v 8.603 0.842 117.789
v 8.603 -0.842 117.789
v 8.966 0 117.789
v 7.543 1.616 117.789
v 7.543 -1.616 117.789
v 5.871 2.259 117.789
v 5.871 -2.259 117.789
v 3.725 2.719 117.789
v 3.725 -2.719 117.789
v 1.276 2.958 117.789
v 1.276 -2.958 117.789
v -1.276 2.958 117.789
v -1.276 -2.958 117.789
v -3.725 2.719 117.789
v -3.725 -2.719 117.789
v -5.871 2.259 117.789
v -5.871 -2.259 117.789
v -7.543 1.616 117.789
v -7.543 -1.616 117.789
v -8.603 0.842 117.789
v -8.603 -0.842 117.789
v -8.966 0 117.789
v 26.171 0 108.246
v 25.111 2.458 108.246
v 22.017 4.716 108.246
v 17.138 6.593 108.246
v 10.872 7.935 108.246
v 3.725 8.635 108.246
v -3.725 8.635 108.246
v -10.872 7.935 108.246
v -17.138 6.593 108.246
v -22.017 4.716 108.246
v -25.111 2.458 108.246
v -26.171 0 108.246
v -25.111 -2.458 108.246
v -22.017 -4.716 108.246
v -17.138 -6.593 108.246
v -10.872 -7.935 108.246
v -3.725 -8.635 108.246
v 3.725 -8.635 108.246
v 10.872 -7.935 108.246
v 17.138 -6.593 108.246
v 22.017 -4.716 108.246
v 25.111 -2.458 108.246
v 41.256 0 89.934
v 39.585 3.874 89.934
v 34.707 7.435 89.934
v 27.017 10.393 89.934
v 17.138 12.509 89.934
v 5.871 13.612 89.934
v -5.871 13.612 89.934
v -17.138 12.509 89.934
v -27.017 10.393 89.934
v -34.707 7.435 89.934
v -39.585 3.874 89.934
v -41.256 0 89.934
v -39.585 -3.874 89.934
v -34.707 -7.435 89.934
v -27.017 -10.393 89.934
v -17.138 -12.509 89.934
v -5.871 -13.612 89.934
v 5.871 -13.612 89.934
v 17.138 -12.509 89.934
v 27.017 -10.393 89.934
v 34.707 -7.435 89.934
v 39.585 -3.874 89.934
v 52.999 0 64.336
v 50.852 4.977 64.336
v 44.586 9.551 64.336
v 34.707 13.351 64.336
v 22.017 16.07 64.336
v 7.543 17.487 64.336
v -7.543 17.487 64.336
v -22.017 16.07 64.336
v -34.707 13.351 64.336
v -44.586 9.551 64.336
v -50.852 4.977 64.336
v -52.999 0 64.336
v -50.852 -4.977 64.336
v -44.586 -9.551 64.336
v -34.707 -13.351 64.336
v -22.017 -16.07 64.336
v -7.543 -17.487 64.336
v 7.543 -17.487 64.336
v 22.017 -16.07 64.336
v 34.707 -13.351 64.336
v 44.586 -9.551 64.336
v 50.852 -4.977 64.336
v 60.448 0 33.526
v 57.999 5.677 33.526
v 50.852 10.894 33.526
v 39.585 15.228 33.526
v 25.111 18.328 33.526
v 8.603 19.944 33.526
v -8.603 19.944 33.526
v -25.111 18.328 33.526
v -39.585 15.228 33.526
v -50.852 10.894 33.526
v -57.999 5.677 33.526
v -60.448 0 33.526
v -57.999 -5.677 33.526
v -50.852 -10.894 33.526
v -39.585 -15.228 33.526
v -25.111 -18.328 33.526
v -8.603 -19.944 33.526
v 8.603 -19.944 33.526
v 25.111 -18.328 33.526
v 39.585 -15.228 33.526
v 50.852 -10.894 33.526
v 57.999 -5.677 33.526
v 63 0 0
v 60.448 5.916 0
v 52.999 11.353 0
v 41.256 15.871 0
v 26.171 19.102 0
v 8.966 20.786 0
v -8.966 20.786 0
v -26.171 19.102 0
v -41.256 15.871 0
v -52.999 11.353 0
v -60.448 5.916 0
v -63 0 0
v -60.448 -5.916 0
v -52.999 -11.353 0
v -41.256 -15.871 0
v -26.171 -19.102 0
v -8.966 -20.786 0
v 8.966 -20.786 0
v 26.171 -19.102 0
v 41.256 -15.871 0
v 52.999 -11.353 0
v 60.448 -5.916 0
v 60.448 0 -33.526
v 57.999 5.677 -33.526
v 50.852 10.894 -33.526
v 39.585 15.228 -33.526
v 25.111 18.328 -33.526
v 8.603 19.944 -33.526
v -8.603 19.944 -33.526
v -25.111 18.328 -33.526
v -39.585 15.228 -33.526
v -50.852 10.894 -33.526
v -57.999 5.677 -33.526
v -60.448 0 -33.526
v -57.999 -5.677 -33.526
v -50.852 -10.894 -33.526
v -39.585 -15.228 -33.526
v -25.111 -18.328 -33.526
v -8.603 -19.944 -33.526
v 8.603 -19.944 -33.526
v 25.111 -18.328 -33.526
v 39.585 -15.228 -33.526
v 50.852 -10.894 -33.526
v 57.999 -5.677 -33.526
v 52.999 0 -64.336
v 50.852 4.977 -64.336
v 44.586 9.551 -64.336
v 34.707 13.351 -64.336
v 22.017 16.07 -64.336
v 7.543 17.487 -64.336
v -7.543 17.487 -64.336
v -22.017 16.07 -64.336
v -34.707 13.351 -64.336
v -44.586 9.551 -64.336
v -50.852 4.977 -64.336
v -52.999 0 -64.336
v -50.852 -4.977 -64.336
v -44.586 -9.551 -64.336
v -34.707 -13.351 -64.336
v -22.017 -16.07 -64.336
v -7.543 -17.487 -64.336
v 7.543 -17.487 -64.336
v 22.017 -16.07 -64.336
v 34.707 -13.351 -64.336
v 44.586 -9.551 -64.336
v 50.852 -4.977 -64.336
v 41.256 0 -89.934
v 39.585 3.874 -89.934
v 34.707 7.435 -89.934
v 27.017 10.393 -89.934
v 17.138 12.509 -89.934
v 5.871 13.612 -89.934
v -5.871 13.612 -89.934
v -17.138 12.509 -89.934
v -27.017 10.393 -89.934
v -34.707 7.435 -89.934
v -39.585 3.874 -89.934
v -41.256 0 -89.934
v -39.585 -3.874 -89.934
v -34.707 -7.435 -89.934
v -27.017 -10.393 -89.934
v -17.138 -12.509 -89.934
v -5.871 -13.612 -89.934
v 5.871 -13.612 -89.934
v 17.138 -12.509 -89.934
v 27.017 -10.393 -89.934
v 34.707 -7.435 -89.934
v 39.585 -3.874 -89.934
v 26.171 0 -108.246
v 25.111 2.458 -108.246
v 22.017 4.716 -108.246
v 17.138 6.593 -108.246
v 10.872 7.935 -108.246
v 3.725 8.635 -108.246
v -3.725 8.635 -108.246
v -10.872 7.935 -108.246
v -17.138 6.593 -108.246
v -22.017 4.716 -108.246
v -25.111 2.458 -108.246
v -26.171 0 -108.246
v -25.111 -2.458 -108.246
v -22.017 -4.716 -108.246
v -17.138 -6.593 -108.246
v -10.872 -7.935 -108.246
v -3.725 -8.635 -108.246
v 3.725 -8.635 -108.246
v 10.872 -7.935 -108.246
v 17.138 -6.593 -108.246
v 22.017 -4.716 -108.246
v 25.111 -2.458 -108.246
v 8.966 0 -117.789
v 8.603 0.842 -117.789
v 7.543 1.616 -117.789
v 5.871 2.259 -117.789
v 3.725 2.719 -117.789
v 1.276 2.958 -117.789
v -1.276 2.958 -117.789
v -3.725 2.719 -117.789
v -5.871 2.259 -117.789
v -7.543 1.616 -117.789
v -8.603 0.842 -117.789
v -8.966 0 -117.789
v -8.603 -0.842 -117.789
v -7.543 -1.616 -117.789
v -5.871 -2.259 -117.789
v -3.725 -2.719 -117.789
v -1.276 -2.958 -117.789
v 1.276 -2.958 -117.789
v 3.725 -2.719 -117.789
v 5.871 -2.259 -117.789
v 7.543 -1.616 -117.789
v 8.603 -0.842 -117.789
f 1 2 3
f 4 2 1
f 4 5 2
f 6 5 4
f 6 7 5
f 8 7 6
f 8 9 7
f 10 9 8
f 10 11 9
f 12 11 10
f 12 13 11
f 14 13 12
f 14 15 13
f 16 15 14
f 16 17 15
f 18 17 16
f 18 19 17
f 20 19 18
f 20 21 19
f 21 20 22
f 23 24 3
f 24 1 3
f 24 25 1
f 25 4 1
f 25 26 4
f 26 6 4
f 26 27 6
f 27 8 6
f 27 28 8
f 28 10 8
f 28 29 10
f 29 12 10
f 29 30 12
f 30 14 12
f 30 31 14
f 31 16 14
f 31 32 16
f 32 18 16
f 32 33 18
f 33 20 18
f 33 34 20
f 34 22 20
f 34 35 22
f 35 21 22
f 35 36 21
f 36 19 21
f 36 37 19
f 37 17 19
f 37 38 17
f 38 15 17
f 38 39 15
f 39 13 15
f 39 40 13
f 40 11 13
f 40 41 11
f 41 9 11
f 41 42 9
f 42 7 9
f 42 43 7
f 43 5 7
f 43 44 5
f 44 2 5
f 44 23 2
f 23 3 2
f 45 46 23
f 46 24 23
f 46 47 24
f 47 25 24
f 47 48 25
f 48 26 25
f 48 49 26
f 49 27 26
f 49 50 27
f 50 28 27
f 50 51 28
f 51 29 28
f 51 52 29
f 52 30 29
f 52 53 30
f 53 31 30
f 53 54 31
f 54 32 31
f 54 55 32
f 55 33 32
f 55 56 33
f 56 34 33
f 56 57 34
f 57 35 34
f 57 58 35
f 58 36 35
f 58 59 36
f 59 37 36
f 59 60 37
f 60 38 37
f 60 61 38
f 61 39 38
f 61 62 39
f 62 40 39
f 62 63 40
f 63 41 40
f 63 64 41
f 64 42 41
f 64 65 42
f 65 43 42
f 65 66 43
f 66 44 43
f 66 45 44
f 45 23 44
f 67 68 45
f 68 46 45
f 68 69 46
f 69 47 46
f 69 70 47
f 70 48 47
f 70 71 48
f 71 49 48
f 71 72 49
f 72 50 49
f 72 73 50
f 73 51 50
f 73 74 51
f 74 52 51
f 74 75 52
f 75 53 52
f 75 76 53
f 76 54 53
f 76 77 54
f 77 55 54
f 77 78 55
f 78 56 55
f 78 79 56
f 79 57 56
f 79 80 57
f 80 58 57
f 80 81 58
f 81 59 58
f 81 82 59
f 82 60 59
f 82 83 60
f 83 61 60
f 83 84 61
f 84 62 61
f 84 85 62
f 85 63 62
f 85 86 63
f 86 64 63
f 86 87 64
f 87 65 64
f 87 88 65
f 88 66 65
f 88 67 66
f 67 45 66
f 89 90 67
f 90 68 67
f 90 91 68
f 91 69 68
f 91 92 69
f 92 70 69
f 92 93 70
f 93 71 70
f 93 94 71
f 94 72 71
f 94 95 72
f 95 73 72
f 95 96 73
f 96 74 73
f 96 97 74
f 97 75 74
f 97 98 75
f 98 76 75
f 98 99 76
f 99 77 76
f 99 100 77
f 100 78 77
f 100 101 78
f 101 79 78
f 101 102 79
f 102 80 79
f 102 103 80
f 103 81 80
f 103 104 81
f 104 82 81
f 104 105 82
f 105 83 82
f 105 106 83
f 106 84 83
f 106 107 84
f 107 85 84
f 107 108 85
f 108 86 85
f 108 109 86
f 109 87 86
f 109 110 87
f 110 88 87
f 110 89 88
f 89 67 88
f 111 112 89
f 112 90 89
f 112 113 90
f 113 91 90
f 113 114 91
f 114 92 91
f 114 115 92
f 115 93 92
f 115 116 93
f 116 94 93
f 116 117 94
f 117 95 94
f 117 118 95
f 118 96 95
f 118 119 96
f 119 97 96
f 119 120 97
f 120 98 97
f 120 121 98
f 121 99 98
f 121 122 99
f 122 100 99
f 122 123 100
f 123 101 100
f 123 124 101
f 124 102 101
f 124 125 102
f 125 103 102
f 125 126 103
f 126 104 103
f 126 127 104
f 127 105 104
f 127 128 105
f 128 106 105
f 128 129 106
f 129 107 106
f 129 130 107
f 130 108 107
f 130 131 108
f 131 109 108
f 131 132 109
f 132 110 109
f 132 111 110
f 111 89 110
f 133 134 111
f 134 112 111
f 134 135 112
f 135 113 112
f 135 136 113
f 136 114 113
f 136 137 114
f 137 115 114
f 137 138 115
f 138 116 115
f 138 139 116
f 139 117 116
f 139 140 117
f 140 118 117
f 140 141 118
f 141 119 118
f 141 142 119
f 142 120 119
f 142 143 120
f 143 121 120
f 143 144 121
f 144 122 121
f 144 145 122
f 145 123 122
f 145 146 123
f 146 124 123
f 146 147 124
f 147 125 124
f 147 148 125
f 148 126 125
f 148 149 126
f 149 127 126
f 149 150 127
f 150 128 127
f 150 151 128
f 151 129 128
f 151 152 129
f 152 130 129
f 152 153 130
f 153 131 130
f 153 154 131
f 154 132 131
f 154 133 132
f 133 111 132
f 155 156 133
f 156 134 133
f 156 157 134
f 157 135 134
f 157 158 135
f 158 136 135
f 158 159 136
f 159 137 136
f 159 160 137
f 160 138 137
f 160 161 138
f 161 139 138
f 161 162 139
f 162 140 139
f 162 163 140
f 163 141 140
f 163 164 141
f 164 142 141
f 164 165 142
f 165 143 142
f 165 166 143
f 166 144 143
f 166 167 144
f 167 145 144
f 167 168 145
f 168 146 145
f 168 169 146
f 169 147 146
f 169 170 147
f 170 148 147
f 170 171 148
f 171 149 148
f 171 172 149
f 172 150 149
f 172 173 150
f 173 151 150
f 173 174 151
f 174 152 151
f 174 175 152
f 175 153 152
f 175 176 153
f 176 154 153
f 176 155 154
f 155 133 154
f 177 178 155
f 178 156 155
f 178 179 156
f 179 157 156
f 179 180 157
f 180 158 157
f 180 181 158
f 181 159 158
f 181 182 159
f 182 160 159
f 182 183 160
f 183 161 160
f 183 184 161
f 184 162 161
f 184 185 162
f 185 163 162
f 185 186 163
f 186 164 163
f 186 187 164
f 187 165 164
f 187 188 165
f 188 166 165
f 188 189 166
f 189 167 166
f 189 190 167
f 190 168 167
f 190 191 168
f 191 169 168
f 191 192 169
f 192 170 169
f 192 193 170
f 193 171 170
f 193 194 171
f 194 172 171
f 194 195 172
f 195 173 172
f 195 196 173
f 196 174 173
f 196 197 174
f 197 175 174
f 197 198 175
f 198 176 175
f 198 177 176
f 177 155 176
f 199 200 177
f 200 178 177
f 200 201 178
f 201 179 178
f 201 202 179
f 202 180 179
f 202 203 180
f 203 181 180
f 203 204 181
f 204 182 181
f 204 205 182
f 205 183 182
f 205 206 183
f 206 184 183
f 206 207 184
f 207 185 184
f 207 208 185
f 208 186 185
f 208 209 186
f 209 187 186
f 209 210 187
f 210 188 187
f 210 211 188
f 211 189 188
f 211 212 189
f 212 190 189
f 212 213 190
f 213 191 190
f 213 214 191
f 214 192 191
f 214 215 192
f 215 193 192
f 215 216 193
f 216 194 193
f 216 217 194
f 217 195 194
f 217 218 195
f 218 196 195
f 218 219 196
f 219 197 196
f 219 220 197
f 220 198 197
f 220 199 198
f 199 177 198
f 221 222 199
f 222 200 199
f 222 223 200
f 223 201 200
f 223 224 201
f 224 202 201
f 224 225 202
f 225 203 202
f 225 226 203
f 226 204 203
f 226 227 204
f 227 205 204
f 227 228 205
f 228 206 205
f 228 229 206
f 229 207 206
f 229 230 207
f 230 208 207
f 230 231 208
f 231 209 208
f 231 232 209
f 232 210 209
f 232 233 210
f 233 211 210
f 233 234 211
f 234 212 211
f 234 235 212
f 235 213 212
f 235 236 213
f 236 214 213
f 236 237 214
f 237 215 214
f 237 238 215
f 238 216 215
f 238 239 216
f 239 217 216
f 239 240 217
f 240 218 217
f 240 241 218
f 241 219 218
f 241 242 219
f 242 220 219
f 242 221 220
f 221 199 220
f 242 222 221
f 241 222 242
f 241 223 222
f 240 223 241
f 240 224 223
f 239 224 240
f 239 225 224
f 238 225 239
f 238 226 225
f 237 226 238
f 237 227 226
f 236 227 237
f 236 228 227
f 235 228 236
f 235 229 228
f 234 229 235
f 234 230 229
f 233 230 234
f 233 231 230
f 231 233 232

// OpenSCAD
// Generated by SolidPython 1.0.1 on 2020-07-29 00:46:48


scale(v = [9, 3, 17]) {
	sphere(r = 7);
}
/***********************************************
*********      SolidPython code:      **********
************************************************
 
# import packages: SolidPython
from solid import *
from solid.utils import *
from itertools import chain, combinations, permutations


class Resize:

    def __init__(self, scad_file):
        self.scad_file = scad_file
        #self.scad_file = import_scad(scad_file)
        # cone/cylinder param:
        self.r1 = 0
        self.r2 = 0
        self.h = 0
        # rectangular prism param:
        self.w = 0
        self.l = 0
        # ellipse param:
        self.r = 0

    # import OpenScad code (file name corresponds to shape)


    # classify shape + parameters
    def assign(self, param1, param2, param3):
        if self.scad_file == 'cone.scad':
            self.r1 = param1
            self.r2 = param2
            self.h = param3
        elif self.scad_file == 'cylinder.scad':
            self.r1 = param1
            self.r2 = param2
            self.h = param3
        elif self.scad_file == 'rectangularPrism.scad':
            self.h = param1
            self.l = param2
            self.w = param3
        else:
            self.r = param1
            self.h = param2

    # resize parameters
    def iterate(self):
        x = range(3, 20, 2)
        i = 1
        if self.scad_file == 'cone.scad':
            tempList = list(permutations(x, 2))
            for temp in tempList:
                param1 = temp[0]
                param2 = temp[1]
                filepath = 'produced_scad_files/' + 'cone' + str(param1) + '_' + str(param2) + '_' + '.scad'
                scad_render_to_file(cylinder(h=param1, r1=param2, r2=0), filepath)

        elif self.scad_file == 'cylinder.scad':
            tempList = list(permutations(x, 3))
            for temp in tempList:
                param1 = temp[0]
                param2 = temp[1]
                filepath = 'produced_scad_files/' + 'cylinder' + str(param1) + '_' + str(param2) + '_' + '.scad'
                scad_render_to_file(cylinder(h=param1, r1=param2, r2=param2), filepath)

        elif self.scad_file == 'rectangularPrism.scad':
            tempList = list(permutations(x, 3))
            for temp in tempList:
                param1 = temp[0]
                param2 = temp[1]
                param3 = temp[2]
                filepath = 'produced_scad_files/' + 'rectangularPrism' + str(param1) + '_' + str(param2) + '_' + str(
                    param3) + '.scad'
                scad_render_to_file(cube(size=(param1, param2, param3)), filepath)

        elif self.scad_file == 'ellipse.scad':
            tempList = list(permutations(x, 4))
            for temp in tempList:
                param1 = temp[0]
                param2 = temp[1]
                param3 = temp[2]
                param4 = temp[3]
                filepath = 'produced_scad_files/' + 'ellipse' + str(param1) + '_' + str(param2) + '_' + str(param3) + '_' + str(param4) + '.scad'
                scad_render_to_file(scale([param1, param2, param3])(sphere(r=param4)), filepath)

    def render_to_scadfile(self):
        scad_render_to_file(scad, 'example.scad') 
 
************************************************/
